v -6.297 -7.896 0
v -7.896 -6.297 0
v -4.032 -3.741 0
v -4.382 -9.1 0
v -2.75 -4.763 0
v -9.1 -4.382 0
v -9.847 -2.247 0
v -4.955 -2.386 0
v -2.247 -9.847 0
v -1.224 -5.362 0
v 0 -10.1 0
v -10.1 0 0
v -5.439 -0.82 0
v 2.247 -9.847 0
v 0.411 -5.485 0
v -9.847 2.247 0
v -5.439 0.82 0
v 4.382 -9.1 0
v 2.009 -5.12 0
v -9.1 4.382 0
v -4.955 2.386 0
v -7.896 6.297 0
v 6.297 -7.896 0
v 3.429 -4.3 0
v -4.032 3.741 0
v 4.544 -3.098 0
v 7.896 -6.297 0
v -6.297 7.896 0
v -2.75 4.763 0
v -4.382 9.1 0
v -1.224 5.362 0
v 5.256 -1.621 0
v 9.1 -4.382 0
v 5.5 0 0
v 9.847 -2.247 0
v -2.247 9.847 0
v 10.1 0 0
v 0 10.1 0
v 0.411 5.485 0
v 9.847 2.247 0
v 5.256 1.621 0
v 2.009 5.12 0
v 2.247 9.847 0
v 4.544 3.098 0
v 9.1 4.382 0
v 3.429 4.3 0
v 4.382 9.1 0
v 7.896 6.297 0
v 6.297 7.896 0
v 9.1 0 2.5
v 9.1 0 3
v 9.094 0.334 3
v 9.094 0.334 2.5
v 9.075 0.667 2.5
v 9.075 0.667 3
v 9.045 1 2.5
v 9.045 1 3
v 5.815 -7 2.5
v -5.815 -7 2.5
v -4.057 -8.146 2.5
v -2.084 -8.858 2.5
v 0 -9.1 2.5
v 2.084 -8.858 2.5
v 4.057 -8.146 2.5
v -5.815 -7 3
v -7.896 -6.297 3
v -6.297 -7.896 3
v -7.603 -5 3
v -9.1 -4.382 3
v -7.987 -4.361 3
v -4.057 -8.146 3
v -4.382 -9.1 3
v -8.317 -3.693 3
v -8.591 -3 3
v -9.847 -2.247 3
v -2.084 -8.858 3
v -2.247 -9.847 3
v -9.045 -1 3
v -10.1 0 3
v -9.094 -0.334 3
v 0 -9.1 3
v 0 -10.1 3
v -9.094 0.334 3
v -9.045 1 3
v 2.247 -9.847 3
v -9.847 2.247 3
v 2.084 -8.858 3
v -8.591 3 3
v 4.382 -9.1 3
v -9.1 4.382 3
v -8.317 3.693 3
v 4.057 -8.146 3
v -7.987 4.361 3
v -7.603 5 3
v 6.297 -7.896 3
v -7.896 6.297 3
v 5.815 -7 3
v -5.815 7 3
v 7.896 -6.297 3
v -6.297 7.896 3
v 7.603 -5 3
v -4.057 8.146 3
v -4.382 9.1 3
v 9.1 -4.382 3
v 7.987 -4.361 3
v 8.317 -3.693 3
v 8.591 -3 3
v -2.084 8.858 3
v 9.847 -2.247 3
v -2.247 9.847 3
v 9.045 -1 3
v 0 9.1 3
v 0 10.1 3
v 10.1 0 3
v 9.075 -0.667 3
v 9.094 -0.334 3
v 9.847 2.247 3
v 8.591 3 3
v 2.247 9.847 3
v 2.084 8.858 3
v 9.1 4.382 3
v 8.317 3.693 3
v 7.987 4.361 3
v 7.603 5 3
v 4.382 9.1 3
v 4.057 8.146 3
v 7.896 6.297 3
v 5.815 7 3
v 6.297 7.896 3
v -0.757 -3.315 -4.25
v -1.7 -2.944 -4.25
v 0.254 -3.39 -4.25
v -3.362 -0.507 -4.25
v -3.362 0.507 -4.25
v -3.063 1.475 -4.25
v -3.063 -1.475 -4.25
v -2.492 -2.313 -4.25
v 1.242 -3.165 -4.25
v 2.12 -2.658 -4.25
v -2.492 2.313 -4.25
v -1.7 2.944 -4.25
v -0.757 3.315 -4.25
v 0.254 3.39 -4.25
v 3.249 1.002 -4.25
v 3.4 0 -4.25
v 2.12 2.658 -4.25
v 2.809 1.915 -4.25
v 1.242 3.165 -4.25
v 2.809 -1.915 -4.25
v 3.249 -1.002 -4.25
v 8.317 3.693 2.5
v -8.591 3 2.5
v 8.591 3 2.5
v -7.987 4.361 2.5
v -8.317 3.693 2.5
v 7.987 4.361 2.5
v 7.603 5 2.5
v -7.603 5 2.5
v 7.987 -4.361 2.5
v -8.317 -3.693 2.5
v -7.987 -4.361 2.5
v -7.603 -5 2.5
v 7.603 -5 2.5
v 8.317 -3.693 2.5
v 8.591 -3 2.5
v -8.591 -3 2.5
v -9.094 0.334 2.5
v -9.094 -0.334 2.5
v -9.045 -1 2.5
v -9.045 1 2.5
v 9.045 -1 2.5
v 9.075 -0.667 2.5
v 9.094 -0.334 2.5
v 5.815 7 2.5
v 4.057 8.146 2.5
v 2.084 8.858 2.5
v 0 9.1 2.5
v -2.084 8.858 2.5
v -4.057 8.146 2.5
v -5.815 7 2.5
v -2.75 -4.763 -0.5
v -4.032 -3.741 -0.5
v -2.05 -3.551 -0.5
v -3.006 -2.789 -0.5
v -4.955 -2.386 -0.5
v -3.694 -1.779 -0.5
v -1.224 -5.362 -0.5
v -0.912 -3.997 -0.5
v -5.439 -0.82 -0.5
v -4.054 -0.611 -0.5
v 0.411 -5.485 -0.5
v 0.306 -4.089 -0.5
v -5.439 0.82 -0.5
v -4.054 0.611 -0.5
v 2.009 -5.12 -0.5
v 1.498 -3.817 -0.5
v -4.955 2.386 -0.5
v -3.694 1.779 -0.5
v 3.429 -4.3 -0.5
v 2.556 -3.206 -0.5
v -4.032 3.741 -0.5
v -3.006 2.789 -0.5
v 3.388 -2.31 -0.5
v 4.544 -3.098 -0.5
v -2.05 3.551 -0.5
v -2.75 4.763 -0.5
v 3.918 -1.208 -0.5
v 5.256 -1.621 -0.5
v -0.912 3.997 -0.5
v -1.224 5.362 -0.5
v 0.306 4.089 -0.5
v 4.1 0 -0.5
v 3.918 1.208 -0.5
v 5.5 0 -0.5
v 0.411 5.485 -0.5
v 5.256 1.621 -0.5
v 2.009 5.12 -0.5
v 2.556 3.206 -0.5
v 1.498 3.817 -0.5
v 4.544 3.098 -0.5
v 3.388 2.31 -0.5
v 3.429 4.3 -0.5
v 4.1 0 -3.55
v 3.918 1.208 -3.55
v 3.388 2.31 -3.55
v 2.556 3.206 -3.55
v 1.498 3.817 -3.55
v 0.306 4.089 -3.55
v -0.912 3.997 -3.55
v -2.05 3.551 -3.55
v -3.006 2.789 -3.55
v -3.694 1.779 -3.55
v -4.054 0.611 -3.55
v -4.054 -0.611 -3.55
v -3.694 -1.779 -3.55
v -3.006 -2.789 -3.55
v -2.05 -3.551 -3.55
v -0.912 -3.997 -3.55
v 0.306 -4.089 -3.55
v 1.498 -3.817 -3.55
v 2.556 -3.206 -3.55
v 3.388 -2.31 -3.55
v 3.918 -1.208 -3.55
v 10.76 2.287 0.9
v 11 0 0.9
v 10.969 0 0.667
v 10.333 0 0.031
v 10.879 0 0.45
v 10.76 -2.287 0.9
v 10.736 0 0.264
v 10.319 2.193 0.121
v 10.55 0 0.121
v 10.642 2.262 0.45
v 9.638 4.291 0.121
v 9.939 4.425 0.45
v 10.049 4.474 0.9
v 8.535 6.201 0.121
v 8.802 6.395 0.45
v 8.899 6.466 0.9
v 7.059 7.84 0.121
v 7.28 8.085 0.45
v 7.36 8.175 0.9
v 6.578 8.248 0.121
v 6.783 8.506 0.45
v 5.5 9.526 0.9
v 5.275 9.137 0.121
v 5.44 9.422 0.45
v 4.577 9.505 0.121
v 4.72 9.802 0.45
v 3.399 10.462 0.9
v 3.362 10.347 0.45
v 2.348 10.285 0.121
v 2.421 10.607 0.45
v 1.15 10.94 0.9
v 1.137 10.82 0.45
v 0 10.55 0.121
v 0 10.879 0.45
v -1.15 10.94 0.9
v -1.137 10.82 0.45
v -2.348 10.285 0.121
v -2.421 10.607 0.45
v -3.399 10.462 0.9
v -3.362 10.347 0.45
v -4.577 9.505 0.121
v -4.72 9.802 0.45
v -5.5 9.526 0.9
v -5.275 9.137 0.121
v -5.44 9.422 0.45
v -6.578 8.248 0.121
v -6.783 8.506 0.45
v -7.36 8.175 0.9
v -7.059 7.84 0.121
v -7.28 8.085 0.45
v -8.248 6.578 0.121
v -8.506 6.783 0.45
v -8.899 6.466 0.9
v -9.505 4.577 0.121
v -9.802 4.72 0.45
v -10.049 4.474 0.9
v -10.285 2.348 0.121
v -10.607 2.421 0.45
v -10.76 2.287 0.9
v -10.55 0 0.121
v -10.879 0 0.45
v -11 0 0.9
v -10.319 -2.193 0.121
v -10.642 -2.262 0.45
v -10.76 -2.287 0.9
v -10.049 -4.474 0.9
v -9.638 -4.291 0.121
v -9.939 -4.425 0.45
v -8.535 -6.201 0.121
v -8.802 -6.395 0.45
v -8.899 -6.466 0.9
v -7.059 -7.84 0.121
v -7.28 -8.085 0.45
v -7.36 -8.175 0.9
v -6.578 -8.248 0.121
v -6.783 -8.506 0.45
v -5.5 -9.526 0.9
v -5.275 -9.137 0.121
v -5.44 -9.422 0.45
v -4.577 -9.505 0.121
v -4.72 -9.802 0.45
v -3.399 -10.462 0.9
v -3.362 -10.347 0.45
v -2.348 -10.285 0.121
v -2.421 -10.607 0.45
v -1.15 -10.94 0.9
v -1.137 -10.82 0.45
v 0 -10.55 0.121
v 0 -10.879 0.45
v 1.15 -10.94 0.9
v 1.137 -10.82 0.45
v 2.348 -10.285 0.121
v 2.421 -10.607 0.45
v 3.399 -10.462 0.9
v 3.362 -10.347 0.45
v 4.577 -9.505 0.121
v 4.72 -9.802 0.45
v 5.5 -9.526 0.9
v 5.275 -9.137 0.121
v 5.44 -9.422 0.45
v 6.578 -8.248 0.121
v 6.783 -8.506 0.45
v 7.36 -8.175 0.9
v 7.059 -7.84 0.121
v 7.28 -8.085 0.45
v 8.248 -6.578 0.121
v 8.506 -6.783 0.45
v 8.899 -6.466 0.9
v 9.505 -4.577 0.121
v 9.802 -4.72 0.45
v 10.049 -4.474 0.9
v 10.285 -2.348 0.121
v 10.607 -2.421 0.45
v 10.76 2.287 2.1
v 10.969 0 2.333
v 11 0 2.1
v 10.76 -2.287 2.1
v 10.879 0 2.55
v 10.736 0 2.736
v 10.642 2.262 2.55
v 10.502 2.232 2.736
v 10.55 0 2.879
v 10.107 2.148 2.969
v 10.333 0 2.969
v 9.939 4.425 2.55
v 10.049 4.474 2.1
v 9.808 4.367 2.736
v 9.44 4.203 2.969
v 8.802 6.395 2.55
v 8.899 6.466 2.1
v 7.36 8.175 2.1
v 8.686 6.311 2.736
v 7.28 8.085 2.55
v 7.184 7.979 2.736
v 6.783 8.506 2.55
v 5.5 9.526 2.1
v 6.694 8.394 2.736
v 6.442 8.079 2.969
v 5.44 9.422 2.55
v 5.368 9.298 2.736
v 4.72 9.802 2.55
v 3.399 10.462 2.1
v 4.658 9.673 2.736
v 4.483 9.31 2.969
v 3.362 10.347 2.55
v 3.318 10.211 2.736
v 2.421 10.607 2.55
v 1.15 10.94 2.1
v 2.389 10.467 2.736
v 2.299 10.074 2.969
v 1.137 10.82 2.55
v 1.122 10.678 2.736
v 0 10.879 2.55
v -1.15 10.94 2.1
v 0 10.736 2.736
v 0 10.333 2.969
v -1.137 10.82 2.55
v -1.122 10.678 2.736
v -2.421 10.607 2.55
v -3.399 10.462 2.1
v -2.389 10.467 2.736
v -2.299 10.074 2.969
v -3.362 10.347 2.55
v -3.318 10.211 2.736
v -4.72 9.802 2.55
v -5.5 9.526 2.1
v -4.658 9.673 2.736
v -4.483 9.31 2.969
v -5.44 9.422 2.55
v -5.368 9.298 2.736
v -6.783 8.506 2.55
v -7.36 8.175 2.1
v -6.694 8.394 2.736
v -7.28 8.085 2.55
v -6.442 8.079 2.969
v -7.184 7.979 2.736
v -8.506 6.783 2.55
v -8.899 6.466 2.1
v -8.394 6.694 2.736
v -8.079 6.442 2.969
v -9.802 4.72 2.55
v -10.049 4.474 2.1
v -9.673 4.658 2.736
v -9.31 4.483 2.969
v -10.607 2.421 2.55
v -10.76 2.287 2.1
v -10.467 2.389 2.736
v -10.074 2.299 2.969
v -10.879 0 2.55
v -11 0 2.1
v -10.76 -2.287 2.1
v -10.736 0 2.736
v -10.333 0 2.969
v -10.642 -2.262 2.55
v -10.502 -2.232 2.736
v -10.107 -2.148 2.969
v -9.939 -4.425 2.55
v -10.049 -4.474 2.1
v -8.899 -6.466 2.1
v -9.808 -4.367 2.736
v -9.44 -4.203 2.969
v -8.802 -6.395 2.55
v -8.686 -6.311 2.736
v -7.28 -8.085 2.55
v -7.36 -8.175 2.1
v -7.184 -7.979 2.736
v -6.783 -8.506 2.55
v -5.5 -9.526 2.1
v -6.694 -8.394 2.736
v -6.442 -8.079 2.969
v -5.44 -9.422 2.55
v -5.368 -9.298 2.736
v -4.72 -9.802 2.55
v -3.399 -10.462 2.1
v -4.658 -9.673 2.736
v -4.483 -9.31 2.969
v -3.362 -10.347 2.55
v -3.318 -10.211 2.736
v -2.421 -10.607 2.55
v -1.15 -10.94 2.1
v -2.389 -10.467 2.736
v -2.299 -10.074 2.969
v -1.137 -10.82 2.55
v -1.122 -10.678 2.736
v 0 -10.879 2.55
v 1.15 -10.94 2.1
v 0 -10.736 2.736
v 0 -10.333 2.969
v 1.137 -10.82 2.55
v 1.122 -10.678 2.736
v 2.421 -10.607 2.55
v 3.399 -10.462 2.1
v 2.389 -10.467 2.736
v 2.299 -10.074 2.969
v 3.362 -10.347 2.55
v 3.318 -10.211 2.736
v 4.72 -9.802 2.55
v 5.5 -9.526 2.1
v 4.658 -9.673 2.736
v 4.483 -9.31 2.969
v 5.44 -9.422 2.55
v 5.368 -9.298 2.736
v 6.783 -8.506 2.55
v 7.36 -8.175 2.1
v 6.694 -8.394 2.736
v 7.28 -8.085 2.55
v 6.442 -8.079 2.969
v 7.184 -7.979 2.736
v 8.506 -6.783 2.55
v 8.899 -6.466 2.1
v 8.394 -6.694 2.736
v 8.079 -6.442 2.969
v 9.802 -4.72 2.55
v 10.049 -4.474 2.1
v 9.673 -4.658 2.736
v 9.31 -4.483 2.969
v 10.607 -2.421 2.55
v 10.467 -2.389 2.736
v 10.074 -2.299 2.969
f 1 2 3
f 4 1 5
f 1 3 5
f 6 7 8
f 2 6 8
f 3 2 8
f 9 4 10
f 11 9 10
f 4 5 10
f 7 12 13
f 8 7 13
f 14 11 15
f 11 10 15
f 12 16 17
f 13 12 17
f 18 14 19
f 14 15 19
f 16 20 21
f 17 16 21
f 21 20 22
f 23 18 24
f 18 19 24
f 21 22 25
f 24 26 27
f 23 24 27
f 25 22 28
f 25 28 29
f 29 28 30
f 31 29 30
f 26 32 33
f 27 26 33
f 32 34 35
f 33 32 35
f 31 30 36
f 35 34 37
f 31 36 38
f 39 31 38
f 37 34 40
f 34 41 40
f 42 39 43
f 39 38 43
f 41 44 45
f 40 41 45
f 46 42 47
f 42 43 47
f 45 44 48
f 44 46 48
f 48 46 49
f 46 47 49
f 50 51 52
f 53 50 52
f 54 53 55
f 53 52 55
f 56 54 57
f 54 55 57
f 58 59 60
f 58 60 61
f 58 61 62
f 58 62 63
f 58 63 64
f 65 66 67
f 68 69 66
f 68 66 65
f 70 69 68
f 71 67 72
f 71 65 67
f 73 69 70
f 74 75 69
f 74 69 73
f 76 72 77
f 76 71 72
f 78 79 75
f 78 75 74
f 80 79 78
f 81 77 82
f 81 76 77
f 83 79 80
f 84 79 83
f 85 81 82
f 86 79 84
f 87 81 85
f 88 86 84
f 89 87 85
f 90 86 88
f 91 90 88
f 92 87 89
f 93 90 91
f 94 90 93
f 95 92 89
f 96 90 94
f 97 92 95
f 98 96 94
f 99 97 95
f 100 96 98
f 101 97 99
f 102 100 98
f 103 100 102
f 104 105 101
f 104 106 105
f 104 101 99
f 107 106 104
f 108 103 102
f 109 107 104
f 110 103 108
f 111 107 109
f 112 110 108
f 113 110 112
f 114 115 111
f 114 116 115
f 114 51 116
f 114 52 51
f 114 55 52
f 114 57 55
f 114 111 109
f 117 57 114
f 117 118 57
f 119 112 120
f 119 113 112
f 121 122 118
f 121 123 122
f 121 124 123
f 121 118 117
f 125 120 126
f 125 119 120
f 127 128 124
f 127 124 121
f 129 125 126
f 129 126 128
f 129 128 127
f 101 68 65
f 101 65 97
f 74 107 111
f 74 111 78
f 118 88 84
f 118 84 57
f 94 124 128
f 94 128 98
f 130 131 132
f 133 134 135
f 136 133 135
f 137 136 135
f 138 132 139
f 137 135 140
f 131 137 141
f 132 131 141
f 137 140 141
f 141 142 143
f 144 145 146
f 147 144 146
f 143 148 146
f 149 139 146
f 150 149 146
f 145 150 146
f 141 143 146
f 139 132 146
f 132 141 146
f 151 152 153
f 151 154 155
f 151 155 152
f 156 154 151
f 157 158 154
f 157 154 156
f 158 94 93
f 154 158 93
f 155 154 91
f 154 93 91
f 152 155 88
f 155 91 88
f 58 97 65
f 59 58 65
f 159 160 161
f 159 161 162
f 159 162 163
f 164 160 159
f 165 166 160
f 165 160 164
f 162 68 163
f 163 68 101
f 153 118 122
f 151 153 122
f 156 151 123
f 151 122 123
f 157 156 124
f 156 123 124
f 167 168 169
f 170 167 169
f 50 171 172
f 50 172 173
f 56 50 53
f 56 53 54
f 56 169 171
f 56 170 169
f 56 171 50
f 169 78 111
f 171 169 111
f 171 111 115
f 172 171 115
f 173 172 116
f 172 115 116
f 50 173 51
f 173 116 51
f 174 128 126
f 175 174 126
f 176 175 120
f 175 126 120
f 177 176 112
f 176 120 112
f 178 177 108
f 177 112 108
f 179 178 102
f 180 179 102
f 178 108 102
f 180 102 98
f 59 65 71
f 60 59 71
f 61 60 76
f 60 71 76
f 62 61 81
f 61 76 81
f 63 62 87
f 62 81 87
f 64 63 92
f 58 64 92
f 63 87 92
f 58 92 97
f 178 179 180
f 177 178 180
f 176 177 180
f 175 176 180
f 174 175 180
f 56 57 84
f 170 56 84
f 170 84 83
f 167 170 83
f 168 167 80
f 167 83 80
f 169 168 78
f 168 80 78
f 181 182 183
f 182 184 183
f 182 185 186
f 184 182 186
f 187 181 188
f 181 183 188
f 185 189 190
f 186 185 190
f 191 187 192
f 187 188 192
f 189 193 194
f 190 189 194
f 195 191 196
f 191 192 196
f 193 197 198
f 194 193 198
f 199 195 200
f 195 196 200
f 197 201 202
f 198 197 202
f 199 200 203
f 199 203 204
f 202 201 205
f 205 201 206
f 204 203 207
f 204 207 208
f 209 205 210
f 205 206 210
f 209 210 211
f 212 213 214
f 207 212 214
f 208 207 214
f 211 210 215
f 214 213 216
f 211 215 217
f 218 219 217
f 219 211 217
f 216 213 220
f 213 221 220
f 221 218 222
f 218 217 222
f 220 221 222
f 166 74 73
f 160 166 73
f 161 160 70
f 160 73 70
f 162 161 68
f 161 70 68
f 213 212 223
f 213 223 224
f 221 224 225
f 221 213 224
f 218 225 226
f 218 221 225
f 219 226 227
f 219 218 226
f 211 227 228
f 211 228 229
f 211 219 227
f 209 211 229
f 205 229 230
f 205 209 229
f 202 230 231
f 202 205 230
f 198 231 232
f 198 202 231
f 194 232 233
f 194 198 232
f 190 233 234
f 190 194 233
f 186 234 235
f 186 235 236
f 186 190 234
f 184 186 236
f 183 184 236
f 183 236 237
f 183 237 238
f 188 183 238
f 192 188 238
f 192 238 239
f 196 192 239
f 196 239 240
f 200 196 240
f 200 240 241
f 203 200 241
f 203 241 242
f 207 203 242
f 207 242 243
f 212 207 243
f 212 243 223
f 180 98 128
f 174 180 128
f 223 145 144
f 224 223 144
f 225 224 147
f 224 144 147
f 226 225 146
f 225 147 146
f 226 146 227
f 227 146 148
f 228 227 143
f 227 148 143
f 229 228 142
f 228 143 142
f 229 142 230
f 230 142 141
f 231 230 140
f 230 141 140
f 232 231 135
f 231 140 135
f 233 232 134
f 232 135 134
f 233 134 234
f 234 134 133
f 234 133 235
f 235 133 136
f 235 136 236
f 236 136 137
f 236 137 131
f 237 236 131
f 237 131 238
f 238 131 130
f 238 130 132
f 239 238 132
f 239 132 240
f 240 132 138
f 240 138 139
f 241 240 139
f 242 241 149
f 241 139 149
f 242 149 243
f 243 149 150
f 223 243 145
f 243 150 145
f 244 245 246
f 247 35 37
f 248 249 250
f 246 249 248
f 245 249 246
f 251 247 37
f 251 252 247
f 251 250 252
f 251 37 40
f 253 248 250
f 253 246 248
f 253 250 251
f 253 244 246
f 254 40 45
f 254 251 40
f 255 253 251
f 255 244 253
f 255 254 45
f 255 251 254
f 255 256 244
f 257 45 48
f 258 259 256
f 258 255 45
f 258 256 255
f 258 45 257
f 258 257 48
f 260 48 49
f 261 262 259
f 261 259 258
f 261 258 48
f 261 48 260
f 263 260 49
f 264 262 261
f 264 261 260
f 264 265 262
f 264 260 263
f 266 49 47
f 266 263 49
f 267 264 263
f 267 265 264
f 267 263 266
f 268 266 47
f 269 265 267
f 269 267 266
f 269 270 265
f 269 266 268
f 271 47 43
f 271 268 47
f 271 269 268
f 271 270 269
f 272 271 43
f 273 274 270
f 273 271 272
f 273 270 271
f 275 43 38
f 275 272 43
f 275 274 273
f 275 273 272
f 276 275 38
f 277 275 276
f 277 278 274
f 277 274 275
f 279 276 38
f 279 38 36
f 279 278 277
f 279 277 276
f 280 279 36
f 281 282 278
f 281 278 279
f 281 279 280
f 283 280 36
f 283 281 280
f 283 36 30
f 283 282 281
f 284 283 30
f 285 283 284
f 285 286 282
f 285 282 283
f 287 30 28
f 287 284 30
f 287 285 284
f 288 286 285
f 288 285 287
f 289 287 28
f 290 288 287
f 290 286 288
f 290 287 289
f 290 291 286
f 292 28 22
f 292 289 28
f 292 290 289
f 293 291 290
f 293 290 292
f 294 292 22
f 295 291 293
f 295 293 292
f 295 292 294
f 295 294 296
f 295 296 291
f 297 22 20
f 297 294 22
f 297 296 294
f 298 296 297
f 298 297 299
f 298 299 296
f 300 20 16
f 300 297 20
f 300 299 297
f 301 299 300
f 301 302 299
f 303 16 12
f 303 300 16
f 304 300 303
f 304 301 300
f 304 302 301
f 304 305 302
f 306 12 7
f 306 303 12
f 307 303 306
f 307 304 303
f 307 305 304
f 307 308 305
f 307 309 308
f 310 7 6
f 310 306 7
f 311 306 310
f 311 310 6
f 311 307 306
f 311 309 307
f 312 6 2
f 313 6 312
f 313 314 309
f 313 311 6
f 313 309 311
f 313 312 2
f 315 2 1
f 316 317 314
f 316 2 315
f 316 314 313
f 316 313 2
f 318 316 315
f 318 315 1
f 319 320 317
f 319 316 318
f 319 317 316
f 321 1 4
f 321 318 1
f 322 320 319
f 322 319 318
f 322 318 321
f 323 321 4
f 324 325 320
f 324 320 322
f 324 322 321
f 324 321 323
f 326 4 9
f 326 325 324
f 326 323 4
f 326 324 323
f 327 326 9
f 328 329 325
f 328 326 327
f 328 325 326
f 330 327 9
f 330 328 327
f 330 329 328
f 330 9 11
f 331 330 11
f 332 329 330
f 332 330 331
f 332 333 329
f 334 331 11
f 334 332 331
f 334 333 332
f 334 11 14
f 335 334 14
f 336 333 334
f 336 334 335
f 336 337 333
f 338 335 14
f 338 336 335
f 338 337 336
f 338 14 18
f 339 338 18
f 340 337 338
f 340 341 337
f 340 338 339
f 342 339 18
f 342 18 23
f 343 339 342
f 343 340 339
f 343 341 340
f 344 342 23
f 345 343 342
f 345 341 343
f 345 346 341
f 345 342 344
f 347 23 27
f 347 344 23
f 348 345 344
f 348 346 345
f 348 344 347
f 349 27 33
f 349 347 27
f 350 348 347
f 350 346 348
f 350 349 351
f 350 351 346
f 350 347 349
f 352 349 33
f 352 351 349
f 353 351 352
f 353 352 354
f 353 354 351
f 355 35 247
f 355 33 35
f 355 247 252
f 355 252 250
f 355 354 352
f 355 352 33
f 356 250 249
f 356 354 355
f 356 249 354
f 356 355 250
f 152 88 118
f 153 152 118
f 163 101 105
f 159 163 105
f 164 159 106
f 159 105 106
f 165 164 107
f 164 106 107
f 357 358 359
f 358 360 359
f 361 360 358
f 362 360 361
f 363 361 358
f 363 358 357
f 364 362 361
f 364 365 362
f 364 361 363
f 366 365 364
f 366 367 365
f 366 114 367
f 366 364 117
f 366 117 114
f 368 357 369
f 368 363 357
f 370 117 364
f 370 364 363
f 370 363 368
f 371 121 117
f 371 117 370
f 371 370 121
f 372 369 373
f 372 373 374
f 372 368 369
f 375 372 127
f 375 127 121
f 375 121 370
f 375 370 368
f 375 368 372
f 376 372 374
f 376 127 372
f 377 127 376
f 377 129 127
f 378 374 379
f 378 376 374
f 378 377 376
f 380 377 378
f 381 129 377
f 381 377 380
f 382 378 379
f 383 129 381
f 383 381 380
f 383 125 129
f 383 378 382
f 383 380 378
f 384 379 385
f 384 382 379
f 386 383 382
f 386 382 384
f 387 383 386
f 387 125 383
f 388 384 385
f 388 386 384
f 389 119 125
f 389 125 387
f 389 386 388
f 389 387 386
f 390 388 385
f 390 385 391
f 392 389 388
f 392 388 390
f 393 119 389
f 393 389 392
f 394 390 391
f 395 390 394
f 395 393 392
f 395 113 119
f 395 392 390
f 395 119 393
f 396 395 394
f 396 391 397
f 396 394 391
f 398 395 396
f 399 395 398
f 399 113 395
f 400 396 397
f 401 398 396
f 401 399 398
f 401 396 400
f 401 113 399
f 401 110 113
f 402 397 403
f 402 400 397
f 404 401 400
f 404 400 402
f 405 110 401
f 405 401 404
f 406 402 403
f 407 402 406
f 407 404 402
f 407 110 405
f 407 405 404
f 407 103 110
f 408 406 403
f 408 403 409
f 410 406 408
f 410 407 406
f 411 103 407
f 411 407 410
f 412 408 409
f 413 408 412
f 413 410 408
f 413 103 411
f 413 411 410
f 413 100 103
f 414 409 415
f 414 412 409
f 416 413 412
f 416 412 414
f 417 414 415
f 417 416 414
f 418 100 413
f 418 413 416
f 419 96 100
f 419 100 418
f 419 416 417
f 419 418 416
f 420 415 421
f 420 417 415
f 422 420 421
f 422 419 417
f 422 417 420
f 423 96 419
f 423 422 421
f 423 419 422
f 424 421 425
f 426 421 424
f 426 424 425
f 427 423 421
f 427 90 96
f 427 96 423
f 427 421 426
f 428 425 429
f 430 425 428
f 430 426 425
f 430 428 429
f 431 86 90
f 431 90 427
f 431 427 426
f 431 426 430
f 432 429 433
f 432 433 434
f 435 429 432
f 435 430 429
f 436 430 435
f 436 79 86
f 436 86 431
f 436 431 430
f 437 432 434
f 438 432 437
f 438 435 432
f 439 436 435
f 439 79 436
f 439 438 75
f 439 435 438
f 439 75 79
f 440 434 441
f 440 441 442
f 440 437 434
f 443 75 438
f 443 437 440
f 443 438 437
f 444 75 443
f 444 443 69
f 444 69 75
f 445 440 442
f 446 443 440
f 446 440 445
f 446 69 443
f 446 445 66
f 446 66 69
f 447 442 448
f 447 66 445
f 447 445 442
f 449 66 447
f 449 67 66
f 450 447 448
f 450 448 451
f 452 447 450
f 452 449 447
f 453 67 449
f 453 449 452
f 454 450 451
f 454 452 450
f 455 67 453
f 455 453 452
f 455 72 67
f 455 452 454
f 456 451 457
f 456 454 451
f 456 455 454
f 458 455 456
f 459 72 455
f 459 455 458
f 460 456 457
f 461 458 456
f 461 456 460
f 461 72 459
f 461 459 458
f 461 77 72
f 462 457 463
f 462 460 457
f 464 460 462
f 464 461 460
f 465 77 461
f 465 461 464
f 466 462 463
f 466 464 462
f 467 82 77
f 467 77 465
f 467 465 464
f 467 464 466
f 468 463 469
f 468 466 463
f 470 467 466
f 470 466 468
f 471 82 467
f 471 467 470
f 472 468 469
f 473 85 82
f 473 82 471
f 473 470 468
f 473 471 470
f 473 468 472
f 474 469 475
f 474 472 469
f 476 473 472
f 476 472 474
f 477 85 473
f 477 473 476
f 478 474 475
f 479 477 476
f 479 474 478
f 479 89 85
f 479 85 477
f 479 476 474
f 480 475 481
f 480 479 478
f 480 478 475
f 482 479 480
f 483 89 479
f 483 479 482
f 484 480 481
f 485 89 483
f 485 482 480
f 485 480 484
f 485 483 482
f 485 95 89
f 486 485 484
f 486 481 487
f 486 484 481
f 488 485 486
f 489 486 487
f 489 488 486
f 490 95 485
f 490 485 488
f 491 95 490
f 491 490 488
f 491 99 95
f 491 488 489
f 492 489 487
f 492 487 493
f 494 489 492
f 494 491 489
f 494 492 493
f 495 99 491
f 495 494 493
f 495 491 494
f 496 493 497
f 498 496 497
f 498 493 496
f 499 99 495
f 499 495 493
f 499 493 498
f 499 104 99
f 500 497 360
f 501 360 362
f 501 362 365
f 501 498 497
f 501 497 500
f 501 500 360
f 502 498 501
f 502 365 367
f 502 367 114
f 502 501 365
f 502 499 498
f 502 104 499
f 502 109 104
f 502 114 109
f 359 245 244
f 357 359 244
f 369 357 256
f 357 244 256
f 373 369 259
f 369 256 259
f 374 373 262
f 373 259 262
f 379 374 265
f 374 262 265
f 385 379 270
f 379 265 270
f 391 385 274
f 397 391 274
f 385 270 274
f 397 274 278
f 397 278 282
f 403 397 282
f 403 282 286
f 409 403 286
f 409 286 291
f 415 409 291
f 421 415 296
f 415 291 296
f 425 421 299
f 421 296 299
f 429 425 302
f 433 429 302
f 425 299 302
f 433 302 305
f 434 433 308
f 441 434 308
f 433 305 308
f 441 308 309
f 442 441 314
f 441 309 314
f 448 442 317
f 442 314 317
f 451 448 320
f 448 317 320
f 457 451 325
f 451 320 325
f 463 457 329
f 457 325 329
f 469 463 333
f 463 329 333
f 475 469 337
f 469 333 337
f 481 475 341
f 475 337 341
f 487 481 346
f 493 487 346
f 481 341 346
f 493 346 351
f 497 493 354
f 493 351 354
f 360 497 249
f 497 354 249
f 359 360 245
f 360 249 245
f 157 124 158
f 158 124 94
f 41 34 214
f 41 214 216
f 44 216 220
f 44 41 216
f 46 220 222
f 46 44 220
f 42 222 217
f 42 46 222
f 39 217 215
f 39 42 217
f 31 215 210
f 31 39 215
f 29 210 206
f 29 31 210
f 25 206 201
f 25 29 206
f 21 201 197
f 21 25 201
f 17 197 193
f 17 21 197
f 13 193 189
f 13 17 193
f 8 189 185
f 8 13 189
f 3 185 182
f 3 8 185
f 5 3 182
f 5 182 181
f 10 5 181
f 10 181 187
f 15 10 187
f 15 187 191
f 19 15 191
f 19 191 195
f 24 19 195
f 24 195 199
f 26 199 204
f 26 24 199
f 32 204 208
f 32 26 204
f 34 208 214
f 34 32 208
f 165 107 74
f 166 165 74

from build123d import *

# Parameters (mm, degrees)
F0_R     = 11
F0_R_2   = 5.5
F0_R_3   = 4.1
F1_DEPTH = 3
F2_DEPTH = 4.25
F3_SIZE  = 0.7
F4_R     = 0.9
F5_DEPTH = 0.5
F7_DEPTH = 0.5


with BuildPart() as f1:
    # F0 (on Top) → F1 (new body)
    with BuildSketch(Plane.XY):
        Circle(F0_R)
        Circle(F0_R_2, mode=Mode.SUBTRACT)
        Circle(F0_R_2)
        Circle(F0_R_3, mode=Mode.SUBTRACT)
        Circle(F0_R_3)
    extrude(amount=F1_DEPTH)

    # F0 (on Top) → F2 (join)
    with BuildSketch(Plane.XY):
        Circle(F0_R_3)
    extrude(amount=-F2_DEPTH)

    # F3
    f3_edges = [f1.edges().sort_by_distance(p)[0] for p in [
        (-4.1, 0, -4.25),
    ]]
    chamfer(f3_edges, length=F3_SIZE)

    # F4
    f4_edges = [f1.edges().sort_by_distance(p)[0] for p in [
        (11, 0, 1.5),
        (-11, 0, 0),
        (-11, 0, 3),
    ]]
    fillet(f4_edges, radius=F4_R)

    # F0 (on Top) → F5 (join)
    with BuildSketch(Plane.XY):
        Circle(F0_R_2)
        Circle(F0_R_3, mode=Mode.SUBTRACT)
    extrude(amount=-F5_DEPTH)

    # F6 (on face) → F7 (cut)
    with BuildSketch(Plane.XY.offset(3)):
        with BuildLine():
            ThreePointArc((1.3453624047, -9), (3.7170414054, -8.3062388113), (5.814636704, -7))
            Line((5.814636704, -7), (-5.814636704, -7))
            ThreePointArc((-5.814636704, -7), (-3.7170414054, -8.3062388113), (-1.3453624047, -9))
            Line((-1.3453624047, -9), (1.3453624047, -9))
        make_face()
        with BuildLine():
            ThreePointArc((7.6032887621, -5), (8.1587971524, -4.0303881979), (8.5912746435, -3))
            Line((8.5912746435, -3), (-8.5912746435, -3))
            ThreePointArc((-8.5912746435, -3), (-8.1587971524, -4.0303881979), (-7.6032887621, -5))
            Line((-7.6032887621, -5), (7.6032887621, -5))
        make_face()
        with BuildLine():
            ThreePointArc((9.044888059, -1), (9.0862115686, -0.5007587558), (9.1, 0))
            ThreePointArc((9.1, 0), (9.0862115686, 0.5007587558), (9.044888059, 1))
            Line((9.044888059, 1), (-9.044888059, 1))
            ThreePointArc((-9.044888059, 1), (-9.1, 0), (-9.044888059, -1))
            Line((-9.044888059, -1), (9.044888059, -1))
        make_face()
        with BuildLine():
            Line((-8.5912746435, 3), (8.5912746435, 3))
            ThreePointArc((8.5912746435, 3), (8.1587971524, 4.0303881979), (7.6032887621, 5))
            Line((7.6032887621, 5), (-7.6032887621, 5))
            ThreePointArc((-7.6032887621, 5), (-8.1587971524, 4.0303881979), (-8.5912746435, 3))
        make_face()
        with BuildLine():
            Line((-5.814636704, 7), (5.814636704, 7))
            ThreePointArc((5.814636704, 7), (3.7170414054, 8.3062388113), (1.3453624047, 9))
            Line((1.3453624047, 9), (-1.3453624047, 9))
            ThreePointArc((-1.3453624047, 9), (-3.7170414054, 8.3062388113), (-5.814636704, 7))
        make_face()
        with BuildLine():
            ThreePointArc((-1.3453624047, -9), (0, -9.1), (1.3453624047, -9))
            Line((1.3453624047, -9), (-1.3453624047, -9))
        make_face()
        with BuildLine():
            Line((-1.3453624047, 9), (1.3453624047, 9))
            ThreePointArc((1.3453624047, 9), (0, 9.1), (-1.3453624047, 9))
        make_face()
    extrude(amount=-F7_DEPTH, mode=Mode.SUBTRACT)


solid = f1.part
